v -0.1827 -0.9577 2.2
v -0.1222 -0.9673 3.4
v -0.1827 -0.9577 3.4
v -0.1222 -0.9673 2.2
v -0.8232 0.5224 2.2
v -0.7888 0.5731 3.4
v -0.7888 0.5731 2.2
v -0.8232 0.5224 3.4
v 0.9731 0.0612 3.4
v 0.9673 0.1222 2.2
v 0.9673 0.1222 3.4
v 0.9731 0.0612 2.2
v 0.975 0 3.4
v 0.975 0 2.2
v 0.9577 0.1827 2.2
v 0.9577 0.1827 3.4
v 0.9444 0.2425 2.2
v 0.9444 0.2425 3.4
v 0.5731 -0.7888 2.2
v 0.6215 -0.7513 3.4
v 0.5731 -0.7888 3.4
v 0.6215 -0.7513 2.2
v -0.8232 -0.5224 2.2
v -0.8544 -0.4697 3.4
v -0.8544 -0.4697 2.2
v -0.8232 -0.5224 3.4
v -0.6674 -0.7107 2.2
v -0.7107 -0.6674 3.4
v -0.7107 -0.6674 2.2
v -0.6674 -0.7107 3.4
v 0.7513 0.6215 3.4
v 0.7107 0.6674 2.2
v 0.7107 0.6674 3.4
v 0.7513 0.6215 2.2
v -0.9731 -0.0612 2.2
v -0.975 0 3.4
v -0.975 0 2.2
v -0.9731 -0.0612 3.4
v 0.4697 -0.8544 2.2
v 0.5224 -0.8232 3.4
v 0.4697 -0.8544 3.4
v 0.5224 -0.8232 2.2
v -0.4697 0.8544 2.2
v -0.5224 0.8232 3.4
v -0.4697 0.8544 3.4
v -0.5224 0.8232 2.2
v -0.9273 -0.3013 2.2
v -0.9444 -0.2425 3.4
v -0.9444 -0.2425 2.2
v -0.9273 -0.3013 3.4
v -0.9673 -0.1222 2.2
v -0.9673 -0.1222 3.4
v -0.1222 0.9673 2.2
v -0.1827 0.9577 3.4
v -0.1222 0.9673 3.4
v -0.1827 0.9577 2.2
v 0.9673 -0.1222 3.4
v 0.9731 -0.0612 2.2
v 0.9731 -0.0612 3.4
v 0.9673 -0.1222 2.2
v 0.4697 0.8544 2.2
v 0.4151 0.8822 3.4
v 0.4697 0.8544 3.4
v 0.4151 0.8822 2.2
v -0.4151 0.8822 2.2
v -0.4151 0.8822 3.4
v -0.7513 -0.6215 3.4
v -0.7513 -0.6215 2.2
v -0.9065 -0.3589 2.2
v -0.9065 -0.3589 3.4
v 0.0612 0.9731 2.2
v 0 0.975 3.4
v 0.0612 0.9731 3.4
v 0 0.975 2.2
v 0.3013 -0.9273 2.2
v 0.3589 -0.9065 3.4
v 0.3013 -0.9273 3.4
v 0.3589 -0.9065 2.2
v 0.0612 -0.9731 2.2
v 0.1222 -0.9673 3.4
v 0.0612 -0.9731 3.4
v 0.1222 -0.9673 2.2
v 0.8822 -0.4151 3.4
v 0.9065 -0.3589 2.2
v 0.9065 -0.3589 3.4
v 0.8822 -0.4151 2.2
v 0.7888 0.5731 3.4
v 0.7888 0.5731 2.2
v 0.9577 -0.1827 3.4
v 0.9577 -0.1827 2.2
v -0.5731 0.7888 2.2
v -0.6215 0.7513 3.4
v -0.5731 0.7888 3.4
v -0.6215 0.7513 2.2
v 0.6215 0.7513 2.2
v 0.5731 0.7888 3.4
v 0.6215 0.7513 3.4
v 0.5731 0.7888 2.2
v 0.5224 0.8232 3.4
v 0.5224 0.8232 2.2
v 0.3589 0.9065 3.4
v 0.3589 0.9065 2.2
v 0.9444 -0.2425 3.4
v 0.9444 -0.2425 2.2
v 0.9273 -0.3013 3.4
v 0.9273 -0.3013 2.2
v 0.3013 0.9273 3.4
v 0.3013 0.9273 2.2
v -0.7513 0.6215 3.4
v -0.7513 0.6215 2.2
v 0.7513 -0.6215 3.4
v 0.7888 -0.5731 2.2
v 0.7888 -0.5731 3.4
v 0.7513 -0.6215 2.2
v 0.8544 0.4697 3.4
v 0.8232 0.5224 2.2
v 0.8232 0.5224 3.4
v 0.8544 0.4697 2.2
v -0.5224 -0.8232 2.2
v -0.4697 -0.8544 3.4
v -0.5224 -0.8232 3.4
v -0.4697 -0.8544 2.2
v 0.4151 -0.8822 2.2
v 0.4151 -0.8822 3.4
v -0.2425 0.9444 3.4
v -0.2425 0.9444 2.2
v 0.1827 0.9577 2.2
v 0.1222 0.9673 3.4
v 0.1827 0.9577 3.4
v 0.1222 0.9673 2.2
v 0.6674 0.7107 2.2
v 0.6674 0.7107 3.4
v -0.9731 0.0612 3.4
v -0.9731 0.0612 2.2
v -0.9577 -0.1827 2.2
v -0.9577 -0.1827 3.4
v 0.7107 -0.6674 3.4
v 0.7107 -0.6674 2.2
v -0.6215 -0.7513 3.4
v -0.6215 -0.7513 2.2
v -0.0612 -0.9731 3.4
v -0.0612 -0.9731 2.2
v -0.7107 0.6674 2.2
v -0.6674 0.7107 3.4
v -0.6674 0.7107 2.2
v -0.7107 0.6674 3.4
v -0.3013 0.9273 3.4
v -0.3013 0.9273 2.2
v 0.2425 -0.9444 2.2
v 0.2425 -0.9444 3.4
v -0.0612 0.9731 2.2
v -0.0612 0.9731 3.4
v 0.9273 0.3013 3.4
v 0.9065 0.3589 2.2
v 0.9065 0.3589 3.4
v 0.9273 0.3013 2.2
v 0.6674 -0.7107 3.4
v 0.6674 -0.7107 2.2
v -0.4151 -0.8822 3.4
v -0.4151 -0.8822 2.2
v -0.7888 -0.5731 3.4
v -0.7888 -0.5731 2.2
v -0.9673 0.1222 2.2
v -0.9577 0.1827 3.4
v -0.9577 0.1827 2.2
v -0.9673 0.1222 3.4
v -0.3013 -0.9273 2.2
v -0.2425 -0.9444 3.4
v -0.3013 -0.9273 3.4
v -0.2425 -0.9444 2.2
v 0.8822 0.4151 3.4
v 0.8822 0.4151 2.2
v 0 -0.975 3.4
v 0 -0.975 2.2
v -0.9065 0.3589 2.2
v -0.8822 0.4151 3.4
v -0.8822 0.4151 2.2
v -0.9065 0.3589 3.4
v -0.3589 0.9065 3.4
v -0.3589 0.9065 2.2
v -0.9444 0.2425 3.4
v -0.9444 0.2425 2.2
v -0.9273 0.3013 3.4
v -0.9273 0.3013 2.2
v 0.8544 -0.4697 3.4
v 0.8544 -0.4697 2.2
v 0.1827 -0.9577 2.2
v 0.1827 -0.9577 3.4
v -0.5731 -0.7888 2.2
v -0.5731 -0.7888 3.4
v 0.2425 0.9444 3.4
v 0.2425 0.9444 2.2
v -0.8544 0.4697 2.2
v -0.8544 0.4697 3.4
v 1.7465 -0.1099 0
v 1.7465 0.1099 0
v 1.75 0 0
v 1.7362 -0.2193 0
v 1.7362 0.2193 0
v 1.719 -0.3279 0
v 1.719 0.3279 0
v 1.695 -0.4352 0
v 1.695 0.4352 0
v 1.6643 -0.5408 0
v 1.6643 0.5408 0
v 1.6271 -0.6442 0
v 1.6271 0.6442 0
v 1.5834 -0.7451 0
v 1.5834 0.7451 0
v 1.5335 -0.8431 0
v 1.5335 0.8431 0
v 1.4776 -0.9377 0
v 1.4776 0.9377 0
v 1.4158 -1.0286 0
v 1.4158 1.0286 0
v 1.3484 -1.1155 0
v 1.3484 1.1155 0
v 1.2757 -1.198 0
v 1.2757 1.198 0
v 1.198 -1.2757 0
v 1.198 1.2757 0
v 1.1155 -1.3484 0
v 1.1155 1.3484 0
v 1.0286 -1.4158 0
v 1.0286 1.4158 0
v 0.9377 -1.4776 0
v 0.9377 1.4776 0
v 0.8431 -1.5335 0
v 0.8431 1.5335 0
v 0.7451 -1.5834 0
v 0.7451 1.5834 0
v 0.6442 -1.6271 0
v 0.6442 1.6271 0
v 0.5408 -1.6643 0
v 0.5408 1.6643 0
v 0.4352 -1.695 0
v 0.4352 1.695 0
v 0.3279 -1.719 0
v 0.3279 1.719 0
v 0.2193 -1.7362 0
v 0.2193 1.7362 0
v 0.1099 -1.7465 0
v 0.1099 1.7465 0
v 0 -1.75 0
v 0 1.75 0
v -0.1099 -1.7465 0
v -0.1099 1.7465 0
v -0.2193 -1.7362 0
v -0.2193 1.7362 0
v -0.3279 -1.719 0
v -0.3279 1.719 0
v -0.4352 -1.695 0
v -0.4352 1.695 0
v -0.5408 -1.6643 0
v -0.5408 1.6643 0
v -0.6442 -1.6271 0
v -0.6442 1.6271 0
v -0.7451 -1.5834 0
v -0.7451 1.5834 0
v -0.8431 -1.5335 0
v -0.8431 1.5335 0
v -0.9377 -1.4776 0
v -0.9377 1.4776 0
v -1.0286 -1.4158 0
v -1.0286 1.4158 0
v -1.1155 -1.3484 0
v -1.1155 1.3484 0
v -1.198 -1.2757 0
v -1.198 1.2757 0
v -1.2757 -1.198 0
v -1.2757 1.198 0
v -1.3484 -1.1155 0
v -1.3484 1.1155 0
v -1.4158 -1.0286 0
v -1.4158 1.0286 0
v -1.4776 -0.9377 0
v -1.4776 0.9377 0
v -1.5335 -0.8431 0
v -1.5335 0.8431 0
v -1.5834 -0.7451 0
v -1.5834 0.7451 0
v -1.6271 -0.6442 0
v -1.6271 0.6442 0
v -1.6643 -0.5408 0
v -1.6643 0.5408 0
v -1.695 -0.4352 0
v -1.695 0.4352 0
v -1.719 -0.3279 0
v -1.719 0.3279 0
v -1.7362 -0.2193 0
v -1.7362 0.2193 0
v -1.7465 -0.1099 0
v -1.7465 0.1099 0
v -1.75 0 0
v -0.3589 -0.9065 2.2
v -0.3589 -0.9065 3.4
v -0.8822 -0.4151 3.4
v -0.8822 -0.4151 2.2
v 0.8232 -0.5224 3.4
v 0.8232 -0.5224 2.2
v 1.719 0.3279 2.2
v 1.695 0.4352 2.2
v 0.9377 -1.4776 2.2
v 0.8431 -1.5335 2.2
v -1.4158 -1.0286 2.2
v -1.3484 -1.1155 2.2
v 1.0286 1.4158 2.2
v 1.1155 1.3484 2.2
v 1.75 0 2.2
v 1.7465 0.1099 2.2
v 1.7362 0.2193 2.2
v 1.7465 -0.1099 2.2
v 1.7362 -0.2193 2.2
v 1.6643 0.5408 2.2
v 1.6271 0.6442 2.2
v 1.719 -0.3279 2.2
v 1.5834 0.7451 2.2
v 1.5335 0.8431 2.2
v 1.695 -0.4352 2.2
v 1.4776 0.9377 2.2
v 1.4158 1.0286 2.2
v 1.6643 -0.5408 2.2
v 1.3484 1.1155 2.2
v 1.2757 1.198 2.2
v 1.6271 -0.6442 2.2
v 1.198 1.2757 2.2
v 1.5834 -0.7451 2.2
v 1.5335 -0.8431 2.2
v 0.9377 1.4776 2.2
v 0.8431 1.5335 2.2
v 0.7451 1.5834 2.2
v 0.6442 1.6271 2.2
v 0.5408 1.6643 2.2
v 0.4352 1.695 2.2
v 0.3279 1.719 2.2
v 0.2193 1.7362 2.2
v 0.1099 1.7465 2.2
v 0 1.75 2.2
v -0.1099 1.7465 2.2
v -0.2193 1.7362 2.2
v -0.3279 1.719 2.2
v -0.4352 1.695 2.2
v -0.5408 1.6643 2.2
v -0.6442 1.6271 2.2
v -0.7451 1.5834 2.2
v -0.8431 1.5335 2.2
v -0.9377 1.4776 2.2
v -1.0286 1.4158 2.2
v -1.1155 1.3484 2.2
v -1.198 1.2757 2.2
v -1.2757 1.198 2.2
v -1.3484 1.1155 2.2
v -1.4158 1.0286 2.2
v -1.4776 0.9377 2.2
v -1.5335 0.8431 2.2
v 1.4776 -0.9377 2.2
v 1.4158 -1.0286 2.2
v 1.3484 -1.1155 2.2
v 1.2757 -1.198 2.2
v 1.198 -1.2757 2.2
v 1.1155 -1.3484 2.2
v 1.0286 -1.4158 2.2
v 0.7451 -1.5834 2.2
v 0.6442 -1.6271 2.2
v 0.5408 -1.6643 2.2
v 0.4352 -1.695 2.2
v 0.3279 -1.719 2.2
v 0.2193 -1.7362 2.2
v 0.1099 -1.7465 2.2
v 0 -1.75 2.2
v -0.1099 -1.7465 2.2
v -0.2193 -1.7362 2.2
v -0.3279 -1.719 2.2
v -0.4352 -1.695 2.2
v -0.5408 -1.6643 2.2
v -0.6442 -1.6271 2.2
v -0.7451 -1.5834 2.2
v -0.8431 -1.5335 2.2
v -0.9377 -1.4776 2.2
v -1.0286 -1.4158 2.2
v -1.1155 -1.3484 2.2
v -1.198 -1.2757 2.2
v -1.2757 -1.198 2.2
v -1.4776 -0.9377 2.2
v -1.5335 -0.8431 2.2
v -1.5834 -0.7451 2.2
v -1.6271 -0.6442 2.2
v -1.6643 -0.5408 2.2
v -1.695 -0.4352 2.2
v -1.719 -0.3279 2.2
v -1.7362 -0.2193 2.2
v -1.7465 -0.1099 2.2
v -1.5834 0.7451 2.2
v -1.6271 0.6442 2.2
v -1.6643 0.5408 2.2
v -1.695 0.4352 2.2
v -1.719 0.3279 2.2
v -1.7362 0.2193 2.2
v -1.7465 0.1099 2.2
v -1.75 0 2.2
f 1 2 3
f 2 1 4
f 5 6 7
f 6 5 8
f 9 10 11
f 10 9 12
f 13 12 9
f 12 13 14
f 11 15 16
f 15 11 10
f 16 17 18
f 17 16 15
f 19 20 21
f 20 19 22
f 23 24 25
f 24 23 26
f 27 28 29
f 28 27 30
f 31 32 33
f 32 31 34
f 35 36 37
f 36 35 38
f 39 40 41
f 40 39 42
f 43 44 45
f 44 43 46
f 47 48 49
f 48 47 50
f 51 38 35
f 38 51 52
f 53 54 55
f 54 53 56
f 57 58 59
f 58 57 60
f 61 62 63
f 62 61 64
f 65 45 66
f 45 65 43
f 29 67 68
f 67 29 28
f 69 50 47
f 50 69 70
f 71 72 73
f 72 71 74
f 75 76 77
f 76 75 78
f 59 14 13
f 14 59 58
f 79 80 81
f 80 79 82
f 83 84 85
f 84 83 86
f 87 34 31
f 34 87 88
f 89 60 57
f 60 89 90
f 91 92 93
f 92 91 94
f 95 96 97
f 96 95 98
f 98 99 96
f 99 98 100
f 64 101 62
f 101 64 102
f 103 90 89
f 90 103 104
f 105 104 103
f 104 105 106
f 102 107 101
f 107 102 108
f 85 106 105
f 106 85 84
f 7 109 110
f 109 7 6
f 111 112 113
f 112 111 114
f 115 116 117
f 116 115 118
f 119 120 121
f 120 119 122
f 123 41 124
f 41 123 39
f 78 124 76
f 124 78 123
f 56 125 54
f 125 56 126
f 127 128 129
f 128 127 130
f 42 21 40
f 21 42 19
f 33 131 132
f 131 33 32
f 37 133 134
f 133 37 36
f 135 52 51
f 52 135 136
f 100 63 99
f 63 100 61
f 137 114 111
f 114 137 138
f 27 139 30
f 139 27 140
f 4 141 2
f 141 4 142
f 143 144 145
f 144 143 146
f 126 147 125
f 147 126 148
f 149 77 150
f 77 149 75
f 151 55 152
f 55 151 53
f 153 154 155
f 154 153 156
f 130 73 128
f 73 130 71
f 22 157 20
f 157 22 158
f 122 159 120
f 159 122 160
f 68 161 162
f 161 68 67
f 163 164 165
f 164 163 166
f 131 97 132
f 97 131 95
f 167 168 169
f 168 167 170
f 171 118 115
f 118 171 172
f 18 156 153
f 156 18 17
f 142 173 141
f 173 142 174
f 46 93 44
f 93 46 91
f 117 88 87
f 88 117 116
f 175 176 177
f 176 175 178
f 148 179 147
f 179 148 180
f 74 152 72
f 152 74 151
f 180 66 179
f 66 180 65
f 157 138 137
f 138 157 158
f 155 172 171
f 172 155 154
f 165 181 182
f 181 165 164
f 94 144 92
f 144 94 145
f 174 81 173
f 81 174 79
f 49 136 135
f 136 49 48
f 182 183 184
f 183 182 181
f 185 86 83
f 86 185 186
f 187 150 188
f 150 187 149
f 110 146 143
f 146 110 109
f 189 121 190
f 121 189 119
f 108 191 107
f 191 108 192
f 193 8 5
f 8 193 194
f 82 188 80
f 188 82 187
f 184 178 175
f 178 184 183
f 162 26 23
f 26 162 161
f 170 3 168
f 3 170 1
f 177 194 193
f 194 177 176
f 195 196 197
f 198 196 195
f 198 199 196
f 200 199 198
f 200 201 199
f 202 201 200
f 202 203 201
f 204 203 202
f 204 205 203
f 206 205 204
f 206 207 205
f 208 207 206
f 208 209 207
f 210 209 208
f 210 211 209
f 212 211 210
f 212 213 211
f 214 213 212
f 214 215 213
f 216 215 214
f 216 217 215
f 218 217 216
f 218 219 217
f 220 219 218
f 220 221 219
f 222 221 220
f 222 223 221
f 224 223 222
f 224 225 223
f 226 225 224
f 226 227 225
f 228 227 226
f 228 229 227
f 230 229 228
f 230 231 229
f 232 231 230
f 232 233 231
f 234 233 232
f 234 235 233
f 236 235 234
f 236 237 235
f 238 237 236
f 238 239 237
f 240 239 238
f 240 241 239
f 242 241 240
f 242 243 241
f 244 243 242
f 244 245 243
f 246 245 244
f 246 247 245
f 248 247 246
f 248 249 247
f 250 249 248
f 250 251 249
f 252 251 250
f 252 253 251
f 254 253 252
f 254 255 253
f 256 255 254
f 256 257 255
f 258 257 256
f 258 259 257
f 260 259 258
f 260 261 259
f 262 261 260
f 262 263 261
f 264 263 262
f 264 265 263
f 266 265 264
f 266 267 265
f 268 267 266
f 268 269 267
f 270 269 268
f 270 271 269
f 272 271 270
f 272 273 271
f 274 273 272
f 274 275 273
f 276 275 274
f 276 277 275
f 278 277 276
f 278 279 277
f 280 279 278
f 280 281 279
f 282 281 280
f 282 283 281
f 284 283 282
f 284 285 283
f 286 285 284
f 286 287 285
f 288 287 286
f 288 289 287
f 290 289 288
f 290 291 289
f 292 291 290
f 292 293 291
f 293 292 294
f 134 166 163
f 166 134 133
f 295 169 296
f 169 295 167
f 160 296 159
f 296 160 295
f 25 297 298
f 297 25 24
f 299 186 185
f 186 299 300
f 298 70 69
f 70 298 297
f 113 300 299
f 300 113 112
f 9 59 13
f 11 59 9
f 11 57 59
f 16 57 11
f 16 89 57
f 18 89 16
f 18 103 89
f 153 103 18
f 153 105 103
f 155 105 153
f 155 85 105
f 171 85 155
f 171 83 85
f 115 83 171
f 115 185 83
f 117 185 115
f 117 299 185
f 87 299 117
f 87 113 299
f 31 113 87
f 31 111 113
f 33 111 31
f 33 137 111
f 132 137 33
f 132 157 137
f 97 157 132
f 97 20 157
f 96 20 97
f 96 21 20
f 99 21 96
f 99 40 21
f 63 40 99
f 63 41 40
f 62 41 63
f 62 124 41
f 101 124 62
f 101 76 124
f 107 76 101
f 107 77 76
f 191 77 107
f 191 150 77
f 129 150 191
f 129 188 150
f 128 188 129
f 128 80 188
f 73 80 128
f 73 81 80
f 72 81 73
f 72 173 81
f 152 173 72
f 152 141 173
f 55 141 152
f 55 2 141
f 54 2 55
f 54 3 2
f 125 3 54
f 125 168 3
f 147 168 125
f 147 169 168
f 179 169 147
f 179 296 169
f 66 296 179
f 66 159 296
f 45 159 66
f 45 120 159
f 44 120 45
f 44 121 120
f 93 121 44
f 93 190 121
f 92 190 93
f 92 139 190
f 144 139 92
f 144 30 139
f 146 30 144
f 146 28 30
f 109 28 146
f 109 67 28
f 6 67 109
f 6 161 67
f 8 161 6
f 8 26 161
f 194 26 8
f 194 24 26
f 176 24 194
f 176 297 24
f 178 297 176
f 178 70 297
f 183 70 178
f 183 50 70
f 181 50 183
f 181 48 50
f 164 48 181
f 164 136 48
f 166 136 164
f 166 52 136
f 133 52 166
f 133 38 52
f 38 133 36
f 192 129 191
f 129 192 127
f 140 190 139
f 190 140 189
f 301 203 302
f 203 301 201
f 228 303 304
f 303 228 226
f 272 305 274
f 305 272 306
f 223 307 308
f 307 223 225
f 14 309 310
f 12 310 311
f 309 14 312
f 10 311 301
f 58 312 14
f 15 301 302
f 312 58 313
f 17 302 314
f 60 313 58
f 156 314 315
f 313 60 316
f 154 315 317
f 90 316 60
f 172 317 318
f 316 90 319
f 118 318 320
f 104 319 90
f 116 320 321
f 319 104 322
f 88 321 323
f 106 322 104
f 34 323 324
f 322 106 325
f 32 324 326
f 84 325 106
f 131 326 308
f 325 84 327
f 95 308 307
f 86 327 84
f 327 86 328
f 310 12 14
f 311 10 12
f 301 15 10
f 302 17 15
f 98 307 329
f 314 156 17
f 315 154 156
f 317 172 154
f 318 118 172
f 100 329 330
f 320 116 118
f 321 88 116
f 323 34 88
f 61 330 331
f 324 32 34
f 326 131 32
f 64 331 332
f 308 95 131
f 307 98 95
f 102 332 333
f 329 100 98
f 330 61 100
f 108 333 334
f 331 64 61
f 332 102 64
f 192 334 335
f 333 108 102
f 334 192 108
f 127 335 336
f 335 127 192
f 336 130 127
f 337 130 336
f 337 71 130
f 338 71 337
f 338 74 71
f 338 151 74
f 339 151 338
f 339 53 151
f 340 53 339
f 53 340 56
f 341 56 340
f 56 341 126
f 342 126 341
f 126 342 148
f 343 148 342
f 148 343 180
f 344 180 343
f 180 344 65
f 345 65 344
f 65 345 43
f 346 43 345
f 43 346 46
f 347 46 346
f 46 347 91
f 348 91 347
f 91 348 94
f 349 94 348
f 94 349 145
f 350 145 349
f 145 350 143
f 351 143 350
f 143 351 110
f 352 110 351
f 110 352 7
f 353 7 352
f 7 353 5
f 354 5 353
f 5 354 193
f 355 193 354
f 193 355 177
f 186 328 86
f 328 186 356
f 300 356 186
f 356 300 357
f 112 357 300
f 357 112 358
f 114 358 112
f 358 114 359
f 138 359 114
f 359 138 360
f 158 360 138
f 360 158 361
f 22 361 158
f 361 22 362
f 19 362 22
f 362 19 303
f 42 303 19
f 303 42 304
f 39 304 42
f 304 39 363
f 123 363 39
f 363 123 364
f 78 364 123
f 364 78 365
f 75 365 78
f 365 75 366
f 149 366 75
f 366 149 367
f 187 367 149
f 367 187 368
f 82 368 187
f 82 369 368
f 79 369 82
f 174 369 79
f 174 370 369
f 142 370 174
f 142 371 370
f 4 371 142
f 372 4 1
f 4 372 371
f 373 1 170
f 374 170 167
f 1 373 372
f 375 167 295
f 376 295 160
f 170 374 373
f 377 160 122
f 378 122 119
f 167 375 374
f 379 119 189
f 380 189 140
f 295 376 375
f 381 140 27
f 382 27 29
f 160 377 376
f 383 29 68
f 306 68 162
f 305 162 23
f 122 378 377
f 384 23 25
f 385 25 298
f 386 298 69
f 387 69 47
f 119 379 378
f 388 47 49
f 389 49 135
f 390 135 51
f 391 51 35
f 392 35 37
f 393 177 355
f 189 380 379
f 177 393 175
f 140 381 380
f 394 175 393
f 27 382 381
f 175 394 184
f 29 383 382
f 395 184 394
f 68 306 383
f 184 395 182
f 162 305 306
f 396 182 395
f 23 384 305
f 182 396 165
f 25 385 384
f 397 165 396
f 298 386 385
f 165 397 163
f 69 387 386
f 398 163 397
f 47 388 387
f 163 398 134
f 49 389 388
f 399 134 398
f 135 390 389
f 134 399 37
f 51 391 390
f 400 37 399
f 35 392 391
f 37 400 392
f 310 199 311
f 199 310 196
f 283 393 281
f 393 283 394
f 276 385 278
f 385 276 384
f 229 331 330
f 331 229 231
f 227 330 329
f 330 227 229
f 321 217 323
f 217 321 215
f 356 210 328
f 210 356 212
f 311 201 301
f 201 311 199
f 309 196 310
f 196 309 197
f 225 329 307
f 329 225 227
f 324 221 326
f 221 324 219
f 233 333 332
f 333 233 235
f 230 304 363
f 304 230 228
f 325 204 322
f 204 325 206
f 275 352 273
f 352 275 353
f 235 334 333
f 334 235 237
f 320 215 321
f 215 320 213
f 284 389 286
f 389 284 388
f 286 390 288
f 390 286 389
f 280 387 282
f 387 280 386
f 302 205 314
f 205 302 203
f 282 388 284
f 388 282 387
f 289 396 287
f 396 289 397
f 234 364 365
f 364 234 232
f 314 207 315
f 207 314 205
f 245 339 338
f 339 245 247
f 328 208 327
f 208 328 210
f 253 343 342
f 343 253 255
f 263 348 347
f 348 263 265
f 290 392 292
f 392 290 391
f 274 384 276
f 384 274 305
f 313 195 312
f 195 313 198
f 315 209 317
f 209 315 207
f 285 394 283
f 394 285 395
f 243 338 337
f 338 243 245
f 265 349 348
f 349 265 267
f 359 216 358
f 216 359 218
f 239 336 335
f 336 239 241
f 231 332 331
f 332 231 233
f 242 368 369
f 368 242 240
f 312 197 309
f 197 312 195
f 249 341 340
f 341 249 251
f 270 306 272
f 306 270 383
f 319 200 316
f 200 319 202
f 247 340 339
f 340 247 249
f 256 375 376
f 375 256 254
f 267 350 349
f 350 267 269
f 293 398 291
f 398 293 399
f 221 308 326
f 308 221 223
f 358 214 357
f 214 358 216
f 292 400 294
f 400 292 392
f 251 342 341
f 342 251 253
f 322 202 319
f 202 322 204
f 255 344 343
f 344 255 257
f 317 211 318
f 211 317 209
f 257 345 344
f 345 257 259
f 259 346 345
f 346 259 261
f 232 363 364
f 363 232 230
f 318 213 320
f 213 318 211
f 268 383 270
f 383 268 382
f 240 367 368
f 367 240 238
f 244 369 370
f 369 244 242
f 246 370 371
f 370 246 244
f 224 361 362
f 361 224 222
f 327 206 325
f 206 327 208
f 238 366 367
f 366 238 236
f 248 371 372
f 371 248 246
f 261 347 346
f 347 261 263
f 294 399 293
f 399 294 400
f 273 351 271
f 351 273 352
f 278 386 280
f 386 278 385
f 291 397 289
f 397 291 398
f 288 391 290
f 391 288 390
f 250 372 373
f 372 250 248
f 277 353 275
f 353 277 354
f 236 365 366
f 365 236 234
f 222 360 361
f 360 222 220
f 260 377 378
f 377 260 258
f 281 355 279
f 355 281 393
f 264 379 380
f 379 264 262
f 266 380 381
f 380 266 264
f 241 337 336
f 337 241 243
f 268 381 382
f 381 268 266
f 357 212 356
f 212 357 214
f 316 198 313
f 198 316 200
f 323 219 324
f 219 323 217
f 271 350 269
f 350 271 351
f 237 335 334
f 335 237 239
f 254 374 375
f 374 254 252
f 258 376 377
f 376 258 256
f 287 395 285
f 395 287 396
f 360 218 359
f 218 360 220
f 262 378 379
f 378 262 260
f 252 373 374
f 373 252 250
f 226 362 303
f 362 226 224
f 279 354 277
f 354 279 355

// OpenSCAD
$fn=100;
cylinder(h = 2.2 + 1.2, r = (2 - 0.05) / 2);
cylinder(h = 2.2, r = 3.5 / 2);
